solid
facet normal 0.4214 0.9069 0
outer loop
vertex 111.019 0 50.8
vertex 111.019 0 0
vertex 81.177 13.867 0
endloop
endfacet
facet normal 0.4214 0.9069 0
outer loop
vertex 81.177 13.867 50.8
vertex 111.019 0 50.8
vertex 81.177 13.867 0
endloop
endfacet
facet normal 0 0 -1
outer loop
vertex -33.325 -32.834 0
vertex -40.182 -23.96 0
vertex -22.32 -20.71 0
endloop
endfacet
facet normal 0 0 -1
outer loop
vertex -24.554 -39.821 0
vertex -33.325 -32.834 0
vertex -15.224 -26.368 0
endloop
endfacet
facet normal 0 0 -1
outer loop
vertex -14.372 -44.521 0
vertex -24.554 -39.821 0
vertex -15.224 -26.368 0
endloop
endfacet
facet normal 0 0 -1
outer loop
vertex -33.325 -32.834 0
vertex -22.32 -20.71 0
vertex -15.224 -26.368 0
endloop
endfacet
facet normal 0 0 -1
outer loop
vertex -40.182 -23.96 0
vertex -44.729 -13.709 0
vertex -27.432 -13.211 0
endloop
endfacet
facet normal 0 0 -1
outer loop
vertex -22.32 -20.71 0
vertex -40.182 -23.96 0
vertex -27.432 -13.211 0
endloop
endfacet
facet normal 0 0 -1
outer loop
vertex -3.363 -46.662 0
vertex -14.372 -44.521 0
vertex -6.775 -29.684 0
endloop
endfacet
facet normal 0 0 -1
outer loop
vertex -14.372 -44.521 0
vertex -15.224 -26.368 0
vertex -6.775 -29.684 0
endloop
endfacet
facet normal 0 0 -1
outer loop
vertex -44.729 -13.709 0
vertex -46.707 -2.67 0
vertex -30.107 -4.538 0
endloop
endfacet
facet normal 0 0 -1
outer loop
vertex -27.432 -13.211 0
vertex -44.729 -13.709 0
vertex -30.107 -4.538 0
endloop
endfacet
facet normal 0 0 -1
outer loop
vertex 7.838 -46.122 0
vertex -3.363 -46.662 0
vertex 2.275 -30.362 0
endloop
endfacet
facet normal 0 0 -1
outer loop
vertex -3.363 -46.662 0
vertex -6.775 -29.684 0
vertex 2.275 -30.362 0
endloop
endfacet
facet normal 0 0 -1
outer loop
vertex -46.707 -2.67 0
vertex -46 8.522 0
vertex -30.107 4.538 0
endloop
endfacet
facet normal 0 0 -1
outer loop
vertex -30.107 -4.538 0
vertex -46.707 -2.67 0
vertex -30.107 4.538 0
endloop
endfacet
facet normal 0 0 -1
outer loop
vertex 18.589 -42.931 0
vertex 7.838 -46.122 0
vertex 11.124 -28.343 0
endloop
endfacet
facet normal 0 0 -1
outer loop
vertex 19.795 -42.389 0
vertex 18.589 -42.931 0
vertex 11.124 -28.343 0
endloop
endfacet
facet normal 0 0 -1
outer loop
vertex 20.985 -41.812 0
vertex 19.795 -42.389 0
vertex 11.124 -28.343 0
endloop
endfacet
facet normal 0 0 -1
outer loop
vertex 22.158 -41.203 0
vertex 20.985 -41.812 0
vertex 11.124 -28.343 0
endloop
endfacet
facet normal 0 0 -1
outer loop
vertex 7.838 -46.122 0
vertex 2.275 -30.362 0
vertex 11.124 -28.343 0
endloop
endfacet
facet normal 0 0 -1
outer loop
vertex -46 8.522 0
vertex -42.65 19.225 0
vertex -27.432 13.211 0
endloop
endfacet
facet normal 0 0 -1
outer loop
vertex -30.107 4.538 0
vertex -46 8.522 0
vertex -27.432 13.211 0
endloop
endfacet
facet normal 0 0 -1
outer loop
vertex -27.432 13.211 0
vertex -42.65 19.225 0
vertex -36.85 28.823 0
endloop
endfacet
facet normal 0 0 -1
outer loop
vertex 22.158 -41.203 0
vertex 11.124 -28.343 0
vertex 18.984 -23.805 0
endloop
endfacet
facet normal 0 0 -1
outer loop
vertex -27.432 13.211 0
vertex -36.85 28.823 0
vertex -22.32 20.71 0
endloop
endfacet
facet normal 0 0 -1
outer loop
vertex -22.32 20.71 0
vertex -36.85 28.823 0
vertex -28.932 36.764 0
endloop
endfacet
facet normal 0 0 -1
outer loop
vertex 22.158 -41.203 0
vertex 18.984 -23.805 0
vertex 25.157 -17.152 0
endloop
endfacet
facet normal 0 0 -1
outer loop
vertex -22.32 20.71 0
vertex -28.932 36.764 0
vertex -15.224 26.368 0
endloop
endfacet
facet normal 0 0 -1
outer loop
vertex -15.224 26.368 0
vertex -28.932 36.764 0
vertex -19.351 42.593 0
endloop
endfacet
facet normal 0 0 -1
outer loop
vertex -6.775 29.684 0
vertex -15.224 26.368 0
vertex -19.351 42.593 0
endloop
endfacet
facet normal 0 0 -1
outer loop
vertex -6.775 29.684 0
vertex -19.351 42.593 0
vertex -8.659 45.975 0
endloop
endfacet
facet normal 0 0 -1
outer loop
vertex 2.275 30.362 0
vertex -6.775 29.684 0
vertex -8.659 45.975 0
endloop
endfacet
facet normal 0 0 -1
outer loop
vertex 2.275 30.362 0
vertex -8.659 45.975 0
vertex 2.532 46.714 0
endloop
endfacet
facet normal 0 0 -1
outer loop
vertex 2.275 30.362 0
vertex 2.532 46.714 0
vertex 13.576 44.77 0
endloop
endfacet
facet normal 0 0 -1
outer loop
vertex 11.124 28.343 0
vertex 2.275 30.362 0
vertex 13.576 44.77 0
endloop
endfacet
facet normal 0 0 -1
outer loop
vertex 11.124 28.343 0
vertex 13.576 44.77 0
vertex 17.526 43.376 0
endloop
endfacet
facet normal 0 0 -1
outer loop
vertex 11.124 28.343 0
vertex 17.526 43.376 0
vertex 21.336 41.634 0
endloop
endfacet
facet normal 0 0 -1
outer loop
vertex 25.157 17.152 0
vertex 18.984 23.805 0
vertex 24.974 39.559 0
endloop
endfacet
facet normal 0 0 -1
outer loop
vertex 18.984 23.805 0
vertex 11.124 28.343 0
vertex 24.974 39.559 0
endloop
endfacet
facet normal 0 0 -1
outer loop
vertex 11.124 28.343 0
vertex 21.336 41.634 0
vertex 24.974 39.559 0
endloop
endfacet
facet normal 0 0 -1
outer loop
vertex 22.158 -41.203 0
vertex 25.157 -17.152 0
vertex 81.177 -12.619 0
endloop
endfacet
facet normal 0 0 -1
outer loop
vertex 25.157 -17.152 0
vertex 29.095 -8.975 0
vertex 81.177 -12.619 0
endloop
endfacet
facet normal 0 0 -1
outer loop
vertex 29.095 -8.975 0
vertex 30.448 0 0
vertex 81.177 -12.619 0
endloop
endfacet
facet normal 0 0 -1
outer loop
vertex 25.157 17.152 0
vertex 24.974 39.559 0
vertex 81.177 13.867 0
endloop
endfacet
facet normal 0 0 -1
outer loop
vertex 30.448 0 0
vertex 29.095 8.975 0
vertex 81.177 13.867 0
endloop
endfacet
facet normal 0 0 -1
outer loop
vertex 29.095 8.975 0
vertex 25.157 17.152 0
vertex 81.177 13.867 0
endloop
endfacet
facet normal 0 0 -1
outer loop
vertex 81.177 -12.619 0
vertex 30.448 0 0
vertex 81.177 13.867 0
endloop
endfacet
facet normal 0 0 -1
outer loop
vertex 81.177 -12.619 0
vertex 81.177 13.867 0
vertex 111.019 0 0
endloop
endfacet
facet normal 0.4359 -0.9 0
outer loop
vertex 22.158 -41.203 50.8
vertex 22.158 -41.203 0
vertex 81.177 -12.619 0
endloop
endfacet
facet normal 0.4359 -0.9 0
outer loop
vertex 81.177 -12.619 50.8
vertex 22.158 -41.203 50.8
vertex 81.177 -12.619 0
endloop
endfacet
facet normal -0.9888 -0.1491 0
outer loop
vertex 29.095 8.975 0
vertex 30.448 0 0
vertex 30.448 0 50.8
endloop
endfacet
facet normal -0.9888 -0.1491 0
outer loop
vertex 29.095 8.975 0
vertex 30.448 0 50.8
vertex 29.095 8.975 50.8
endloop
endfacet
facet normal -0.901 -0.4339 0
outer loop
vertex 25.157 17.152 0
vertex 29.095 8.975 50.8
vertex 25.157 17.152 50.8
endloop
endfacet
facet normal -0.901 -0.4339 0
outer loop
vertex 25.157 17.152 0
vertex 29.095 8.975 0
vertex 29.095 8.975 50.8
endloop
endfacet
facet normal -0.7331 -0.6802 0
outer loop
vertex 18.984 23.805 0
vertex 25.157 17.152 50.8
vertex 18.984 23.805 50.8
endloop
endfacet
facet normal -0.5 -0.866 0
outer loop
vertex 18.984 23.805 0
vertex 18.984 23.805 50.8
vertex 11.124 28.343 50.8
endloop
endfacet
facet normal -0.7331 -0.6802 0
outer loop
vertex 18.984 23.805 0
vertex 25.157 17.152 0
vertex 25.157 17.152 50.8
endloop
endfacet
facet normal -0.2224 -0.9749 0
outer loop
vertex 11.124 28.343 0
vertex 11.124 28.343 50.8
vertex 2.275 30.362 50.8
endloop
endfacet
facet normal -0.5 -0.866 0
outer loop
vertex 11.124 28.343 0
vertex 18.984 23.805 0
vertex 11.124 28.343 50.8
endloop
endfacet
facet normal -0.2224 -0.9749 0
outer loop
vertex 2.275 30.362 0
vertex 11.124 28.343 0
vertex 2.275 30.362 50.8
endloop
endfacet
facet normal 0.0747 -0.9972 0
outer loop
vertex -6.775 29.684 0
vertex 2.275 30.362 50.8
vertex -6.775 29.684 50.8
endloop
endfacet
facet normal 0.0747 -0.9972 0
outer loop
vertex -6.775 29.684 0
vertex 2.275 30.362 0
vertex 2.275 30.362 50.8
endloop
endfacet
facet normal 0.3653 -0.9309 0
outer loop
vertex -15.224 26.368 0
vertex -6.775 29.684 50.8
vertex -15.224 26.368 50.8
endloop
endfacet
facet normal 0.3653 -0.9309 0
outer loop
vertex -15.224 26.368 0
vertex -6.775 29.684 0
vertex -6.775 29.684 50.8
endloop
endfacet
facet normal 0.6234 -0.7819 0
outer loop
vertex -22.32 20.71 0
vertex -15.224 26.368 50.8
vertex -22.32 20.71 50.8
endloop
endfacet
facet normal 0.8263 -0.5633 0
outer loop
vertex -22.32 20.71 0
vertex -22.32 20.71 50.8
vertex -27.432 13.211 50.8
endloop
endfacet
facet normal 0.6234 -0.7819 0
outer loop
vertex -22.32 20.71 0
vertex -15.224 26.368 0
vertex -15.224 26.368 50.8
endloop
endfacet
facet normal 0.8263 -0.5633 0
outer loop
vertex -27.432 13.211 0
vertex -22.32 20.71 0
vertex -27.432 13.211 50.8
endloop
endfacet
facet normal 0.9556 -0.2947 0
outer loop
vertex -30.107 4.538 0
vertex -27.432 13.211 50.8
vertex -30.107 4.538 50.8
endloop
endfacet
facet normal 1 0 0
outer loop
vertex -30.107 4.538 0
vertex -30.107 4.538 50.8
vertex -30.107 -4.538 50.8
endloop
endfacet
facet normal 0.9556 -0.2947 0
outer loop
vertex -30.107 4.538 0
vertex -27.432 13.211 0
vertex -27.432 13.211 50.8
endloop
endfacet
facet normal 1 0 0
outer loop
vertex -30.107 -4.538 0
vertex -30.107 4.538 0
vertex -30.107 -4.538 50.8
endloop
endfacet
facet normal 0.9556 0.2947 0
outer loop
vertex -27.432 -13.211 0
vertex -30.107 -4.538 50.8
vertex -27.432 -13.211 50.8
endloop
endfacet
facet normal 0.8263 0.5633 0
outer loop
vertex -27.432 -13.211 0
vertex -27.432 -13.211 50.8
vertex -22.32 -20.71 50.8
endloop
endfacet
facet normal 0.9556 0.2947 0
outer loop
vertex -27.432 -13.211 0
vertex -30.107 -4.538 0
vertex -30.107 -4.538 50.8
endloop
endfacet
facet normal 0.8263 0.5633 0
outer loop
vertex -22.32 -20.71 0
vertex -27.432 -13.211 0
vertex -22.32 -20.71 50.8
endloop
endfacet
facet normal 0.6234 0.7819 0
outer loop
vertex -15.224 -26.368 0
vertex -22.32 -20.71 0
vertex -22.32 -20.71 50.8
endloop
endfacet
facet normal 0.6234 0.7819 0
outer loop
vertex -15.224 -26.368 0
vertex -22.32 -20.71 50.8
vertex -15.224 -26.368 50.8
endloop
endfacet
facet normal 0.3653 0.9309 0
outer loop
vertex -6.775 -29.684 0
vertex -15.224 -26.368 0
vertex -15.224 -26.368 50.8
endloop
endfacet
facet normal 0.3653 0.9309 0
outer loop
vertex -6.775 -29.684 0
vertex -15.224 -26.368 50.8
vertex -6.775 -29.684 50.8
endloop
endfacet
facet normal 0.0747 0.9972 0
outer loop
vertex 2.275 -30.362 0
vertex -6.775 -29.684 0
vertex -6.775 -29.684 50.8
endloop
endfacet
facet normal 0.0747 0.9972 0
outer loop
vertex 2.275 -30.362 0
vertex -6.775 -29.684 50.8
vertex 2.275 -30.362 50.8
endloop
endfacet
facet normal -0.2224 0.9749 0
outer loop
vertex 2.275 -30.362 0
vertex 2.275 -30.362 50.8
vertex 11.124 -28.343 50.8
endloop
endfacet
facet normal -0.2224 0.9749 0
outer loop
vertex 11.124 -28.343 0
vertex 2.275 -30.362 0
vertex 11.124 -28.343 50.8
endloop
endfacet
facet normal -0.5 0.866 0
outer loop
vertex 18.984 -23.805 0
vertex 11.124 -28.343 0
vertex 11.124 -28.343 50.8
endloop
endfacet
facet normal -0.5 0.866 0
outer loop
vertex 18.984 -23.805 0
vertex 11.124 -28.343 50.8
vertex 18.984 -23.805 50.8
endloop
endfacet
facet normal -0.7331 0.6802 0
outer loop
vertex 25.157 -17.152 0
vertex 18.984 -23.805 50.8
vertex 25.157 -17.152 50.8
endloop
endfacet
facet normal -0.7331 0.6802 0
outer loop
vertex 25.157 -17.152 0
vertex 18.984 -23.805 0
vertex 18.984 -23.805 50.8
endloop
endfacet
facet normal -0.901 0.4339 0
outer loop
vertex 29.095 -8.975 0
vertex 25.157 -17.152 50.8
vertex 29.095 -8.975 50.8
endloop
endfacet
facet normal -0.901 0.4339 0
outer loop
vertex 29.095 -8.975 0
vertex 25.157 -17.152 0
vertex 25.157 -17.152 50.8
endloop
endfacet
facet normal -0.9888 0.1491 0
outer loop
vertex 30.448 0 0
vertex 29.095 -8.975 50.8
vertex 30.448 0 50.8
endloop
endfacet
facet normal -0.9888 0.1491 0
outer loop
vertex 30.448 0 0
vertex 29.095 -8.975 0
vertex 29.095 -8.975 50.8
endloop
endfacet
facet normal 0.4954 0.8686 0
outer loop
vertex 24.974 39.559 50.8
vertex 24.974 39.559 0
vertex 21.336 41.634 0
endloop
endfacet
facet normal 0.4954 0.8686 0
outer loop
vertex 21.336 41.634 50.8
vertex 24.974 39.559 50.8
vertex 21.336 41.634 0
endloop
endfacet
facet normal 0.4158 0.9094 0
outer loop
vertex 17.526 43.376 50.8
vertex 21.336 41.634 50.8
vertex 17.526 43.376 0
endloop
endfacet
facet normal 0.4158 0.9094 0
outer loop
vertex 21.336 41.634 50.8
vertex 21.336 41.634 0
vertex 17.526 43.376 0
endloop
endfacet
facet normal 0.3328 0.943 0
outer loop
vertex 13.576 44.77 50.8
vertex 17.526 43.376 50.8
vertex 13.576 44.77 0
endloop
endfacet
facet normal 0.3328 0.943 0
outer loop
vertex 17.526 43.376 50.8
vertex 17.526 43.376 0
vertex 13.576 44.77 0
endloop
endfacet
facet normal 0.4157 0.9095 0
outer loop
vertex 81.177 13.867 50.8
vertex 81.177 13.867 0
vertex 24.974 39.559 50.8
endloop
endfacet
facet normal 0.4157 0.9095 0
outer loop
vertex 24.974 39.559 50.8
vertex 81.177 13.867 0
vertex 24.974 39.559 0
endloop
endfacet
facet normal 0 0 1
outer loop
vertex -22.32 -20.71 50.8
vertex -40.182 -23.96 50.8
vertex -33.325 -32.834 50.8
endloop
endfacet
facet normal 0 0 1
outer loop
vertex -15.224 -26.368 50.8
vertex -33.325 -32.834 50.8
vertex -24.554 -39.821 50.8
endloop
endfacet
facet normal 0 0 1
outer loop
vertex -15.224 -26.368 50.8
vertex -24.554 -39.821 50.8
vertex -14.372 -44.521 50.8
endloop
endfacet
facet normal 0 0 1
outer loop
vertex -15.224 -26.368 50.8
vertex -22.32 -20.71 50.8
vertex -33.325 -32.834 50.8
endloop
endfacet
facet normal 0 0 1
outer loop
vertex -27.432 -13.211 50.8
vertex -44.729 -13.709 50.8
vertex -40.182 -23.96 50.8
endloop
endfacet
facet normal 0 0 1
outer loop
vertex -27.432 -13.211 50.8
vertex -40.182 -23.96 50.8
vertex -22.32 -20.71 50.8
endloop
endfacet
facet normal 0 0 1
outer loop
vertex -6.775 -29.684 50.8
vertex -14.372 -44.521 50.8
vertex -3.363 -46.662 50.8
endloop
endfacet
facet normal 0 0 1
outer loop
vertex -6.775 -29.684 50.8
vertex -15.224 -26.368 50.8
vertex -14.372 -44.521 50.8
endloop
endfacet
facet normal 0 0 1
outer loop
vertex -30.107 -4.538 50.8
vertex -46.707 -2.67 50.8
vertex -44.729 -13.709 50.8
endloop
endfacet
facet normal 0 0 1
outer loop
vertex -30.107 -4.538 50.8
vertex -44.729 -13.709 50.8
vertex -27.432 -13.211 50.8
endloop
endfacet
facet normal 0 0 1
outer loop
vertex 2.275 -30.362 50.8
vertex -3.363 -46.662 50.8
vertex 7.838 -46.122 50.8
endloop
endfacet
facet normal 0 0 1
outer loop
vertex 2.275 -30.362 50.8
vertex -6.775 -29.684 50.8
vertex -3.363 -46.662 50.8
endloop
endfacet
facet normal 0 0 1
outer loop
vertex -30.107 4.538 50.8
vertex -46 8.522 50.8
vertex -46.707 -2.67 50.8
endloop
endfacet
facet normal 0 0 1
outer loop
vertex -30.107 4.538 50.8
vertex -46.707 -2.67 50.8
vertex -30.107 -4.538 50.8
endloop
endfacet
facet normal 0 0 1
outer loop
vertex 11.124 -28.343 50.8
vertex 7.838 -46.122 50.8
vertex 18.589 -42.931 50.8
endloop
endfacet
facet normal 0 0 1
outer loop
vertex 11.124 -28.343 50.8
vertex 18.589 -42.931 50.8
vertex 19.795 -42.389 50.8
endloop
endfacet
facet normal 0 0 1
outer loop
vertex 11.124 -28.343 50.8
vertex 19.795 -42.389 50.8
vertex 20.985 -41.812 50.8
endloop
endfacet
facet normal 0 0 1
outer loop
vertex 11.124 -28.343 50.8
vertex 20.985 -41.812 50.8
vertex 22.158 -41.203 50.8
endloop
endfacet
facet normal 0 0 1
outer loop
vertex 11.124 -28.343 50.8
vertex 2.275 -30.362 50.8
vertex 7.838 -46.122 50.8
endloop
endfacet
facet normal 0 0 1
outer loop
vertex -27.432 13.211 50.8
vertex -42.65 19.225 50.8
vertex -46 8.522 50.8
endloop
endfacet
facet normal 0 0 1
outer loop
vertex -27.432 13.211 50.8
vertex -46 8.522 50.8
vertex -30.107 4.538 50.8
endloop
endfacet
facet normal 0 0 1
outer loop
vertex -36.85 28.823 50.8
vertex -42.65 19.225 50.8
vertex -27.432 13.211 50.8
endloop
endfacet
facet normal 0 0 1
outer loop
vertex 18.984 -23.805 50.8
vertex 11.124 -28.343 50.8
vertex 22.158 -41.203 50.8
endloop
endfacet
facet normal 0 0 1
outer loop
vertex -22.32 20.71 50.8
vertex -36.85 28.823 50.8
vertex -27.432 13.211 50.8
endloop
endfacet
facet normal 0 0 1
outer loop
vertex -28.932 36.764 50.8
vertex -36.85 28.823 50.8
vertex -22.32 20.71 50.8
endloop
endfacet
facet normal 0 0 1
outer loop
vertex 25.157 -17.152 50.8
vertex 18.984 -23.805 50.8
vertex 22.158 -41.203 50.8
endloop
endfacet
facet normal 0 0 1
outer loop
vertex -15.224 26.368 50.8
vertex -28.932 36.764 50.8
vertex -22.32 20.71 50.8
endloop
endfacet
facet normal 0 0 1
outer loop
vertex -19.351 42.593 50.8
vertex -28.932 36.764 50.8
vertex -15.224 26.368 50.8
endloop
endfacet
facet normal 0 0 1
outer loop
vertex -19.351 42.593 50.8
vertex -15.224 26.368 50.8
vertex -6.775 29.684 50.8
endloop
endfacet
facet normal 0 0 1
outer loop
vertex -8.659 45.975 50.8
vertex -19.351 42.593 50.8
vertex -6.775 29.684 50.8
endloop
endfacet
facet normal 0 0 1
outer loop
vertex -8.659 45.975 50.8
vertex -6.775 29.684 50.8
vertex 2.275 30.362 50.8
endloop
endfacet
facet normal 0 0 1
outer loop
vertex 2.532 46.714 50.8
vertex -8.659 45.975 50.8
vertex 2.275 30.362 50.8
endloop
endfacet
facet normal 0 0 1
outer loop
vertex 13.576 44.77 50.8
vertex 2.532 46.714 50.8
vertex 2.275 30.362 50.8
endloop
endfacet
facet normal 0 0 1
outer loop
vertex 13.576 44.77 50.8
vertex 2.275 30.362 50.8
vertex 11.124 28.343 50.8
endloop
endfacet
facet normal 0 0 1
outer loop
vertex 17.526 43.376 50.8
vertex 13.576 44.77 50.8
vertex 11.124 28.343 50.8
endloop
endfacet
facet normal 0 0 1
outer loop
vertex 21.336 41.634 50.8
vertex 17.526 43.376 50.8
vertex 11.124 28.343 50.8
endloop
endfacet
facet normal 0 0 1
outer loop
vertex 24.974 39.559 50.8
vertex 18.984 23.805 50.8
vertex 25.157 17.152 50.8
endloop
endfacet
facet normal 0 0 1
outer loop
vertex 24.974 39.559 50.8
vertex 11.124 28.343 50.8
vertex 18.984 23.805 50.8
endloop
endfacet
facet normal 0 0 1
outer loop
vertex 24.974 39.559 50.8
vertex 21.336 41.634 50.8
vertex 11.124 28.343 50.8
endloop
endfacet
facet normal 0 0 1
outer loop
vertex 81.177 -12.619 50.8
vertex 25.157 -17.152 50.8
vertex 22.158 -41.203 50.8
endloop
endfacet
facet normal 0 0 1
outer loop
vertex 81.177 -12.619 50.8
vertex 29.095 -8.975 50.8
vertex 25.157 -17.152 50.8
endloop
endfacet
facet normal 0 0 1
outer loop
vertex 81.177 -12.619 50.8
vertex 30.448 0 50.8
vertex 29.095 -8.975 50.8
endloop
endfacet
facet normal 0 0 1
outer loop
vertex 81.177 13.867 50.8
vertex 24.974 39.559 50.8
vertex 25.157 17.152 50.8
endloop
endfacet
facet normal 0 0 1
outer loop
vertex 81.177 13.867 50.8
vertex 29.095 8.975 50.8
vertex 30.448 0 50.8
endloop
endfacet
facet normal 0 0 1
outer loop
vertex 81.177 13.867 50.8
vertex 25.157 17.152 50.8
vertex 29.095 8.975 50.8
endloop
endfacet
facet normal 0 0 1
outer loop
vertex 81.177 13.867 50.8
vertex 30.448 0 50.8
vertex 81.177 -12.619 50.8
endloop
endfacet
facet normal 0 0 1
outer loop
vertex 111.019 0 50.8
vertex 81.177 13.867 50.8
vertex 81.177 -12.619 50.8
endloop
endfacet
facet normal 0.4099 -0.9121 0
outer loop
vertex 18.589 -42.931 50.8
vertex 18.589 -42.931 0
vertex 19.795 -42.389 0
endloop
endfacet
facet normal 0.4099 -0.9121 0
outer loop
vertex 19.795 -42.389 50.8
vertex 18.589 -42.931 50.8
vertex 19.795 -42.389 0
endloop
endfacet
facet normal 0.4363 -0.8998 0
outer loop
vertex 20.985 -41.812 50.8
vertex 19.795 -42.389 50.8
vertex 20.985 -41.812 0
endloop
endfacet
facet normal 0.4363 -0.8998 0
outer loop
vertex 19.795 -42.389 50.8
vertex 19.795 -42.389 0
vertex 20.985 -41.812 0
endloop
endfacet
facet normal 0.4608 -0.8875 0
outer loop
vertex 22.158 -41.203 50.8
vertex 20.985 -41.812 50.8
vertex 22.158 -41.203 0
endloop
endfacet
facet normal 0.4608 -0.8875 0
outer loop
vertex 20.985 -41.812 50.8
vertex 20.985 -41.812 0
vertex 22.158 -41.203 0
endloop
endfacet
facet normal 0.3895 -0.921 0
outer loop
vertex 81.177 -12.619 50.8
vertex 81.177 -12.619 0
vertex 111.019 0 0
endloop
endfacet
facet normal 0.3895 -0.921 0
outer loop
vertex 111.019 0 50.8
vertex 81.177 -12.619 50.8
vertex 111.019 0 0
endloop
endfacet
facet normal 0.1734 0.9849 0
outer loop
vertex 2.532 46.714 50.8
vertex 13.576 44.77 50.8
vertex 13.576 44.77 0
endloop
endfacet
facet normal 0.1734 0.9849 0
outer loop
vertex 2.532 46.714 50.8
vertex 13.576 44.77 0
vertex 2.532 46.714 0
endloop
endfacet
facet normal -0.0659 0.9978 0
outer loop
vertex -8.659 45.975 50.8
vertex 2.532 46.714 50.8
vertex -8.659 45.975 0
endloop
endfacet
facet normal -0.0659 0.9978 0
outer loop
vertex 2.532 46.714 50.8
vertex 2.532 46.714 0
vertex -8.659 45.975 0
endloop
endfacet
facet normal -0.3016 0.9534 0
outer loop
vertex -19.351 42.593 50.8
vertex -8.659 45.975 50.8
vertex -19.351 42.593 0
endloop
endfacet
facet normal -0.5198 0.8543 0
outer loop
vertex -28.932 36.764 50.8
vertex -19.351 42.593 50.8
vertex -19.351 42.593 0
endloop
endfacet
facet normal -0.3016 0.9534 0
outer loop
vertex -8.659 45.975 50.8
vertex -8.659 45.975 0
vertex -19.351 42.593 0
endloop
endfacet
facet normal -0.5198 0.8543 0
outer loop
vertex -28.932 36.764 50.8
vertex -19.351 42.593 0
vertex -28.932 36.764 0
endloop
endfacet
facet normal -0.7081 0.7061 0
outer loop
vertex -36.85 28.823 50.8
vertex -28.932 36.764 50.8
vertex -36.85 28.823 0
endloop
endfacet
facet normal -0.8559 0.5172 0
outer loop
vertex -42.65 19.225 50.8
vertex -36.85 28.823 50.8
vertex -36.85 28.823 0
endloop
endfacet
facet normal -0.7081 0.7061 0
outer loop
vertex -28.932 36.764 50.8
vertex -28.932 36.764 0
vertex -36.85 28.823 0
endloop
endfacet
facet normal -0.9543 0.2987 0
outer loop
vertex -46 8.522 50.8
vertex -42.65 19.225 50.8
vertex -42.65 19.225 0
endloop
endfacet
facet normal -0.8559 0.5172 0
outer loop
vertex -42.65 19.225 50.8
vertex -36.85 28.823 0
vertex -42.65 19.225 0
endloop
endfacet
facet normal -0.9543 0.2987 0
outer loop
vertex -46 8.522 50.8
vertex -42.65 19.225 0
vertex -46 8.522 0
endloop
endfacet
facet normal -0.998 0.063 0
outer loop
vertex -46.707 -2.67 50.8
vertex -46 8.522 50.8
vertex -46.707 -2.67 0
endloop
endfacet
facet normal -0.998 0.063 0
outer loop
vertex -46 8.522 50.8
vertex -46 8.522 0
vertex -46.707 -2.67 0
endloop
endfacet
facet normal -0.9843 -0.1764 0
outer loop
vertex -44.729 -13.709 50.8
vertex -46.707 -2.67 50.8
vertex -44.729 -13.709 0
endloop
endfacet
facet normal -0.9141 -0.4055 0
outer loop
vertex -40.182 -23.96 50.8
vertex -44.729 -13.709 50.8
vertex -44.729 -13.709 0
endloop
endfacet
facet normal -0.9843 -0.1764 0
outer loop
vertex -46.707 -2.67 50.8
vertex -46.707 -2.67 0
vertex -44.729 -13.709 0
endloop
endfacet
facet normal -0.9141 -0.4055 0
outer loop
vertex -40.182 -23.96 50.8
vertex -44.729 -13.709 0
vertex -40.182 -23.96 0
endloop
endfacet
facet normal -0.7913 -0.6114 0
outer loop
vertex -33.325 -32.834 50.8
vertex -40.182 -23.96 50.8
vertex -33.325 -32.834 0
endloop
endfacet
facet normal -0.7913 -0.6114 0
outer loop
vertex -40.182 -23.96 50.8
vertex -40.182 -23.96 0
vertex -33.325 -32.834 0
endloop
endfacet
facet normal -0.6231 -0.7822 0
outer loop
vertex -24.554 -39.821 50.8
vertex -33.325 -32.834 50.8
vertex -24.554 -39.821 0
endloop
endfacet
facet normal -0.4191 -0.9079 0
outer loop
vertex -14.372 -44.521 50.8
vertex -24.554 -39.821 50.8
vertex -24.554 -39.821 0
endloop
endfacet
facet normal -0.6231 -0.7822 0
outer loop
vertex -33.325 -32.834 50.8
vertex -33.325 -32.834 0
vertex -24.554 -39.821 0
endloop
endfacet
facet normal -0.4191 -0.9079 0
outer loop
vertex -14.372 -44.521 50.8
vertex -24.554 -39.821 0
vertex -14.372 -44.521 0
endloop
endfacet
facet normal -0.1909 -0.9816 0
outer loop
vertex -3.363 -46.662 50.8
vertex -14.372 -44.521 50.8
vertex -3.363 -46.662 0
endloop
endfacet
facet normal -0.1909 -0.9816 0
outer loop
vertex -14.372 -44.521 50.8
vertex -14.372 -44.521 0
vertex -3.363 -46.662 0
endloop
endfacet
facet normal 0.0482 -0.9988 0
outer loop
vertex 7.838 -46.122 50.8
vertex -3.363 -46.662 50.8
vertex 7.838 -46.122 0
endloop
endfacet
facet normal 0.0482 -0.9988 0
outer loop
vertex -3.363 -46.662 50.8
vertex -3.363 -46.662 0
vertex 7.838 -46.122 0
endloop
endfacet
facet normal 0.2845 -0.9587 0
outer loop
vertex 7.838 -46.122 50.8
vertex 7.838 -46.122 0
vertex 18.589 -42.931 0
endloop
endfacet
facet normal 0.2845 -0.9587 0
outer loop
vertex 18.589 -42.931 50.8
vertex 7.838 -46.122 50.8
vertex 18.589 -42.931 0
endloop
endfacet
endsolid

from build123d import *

# Parameters (mm, degrees)
F0_R     = 30.447507
F1_DEPTH = 50.8


with BuildPart() as f1:
    # F0 (on Top) → F1 (new body)
    with BuildSketch(Plane.XY):
        Circle(F0_R)
        with BuildLine():
            ThreePointArc((22.158063, -41.202629), (40.157528, -24.000195), (46.782864, 0))
            ThreePointArc((46.782864, 0), (40.969486, 22.586226), (24.974127, 39.559188))
            Line((24.974127, 39.559188), (13.576085, 44.769703))
            ThreePointArc((13.576085, 44.769703), (-46.706625, -2.669747), (18.589059, -42.931146))
            Line((18.589059, -42.931146), (22.158063, -41.202629))
        make_face()
        Circle(F0_R, mode=Mode.SUBTRACT)
        with BuildLine():
            ThreePointArc((24.974127, 39.559188), (40.969486, 22.586226), (46.782864, 0))
            Line((46.782864, 0), (81.176508, 0))
            Line((81.176508, 0), (81.176508, 13.866764))
            Line((81.176508, 13.866764), (24.974127, 39.559188))
        make_face()
        with BuildLine():
            Line((81.176508, 0), (46.782864, 0))
            ThreePointArc((46.782864, 0), (40.157528, -24.000195), (22.158063, -41.202629))
            Line((22.158063, -41.202629), (81.176508, -12.619201))
            Line((81.176508, -12.619201), (81.176508, 0))
        make_face()
        with BuildLine():
            Line((13.576085, 44.769703), (24.974127, 39.559188))
            ThreePointArc((24.974127, 39.559188), (19.450375, 42.547848), (13.576085, 44.769703))
        make_face()
        with BuildLine():
            ThreePointArc((18.589059, -42.931146), (20.391884, -42.104721), (22.158063, -41.202629))
            Line((22.158063, -41.202629), (18.589059, -42.931146))
        make_face()
        Polygon((81.176508, 13.866764), (81.176508, 0), (111.018896, 0), align=None)
        Polygon((111.018896, 0), (81.176508, 0), (81.176508, -12.619201), align=None)
    extrude(amount=F1_DEPTH)


solid = f1.part
